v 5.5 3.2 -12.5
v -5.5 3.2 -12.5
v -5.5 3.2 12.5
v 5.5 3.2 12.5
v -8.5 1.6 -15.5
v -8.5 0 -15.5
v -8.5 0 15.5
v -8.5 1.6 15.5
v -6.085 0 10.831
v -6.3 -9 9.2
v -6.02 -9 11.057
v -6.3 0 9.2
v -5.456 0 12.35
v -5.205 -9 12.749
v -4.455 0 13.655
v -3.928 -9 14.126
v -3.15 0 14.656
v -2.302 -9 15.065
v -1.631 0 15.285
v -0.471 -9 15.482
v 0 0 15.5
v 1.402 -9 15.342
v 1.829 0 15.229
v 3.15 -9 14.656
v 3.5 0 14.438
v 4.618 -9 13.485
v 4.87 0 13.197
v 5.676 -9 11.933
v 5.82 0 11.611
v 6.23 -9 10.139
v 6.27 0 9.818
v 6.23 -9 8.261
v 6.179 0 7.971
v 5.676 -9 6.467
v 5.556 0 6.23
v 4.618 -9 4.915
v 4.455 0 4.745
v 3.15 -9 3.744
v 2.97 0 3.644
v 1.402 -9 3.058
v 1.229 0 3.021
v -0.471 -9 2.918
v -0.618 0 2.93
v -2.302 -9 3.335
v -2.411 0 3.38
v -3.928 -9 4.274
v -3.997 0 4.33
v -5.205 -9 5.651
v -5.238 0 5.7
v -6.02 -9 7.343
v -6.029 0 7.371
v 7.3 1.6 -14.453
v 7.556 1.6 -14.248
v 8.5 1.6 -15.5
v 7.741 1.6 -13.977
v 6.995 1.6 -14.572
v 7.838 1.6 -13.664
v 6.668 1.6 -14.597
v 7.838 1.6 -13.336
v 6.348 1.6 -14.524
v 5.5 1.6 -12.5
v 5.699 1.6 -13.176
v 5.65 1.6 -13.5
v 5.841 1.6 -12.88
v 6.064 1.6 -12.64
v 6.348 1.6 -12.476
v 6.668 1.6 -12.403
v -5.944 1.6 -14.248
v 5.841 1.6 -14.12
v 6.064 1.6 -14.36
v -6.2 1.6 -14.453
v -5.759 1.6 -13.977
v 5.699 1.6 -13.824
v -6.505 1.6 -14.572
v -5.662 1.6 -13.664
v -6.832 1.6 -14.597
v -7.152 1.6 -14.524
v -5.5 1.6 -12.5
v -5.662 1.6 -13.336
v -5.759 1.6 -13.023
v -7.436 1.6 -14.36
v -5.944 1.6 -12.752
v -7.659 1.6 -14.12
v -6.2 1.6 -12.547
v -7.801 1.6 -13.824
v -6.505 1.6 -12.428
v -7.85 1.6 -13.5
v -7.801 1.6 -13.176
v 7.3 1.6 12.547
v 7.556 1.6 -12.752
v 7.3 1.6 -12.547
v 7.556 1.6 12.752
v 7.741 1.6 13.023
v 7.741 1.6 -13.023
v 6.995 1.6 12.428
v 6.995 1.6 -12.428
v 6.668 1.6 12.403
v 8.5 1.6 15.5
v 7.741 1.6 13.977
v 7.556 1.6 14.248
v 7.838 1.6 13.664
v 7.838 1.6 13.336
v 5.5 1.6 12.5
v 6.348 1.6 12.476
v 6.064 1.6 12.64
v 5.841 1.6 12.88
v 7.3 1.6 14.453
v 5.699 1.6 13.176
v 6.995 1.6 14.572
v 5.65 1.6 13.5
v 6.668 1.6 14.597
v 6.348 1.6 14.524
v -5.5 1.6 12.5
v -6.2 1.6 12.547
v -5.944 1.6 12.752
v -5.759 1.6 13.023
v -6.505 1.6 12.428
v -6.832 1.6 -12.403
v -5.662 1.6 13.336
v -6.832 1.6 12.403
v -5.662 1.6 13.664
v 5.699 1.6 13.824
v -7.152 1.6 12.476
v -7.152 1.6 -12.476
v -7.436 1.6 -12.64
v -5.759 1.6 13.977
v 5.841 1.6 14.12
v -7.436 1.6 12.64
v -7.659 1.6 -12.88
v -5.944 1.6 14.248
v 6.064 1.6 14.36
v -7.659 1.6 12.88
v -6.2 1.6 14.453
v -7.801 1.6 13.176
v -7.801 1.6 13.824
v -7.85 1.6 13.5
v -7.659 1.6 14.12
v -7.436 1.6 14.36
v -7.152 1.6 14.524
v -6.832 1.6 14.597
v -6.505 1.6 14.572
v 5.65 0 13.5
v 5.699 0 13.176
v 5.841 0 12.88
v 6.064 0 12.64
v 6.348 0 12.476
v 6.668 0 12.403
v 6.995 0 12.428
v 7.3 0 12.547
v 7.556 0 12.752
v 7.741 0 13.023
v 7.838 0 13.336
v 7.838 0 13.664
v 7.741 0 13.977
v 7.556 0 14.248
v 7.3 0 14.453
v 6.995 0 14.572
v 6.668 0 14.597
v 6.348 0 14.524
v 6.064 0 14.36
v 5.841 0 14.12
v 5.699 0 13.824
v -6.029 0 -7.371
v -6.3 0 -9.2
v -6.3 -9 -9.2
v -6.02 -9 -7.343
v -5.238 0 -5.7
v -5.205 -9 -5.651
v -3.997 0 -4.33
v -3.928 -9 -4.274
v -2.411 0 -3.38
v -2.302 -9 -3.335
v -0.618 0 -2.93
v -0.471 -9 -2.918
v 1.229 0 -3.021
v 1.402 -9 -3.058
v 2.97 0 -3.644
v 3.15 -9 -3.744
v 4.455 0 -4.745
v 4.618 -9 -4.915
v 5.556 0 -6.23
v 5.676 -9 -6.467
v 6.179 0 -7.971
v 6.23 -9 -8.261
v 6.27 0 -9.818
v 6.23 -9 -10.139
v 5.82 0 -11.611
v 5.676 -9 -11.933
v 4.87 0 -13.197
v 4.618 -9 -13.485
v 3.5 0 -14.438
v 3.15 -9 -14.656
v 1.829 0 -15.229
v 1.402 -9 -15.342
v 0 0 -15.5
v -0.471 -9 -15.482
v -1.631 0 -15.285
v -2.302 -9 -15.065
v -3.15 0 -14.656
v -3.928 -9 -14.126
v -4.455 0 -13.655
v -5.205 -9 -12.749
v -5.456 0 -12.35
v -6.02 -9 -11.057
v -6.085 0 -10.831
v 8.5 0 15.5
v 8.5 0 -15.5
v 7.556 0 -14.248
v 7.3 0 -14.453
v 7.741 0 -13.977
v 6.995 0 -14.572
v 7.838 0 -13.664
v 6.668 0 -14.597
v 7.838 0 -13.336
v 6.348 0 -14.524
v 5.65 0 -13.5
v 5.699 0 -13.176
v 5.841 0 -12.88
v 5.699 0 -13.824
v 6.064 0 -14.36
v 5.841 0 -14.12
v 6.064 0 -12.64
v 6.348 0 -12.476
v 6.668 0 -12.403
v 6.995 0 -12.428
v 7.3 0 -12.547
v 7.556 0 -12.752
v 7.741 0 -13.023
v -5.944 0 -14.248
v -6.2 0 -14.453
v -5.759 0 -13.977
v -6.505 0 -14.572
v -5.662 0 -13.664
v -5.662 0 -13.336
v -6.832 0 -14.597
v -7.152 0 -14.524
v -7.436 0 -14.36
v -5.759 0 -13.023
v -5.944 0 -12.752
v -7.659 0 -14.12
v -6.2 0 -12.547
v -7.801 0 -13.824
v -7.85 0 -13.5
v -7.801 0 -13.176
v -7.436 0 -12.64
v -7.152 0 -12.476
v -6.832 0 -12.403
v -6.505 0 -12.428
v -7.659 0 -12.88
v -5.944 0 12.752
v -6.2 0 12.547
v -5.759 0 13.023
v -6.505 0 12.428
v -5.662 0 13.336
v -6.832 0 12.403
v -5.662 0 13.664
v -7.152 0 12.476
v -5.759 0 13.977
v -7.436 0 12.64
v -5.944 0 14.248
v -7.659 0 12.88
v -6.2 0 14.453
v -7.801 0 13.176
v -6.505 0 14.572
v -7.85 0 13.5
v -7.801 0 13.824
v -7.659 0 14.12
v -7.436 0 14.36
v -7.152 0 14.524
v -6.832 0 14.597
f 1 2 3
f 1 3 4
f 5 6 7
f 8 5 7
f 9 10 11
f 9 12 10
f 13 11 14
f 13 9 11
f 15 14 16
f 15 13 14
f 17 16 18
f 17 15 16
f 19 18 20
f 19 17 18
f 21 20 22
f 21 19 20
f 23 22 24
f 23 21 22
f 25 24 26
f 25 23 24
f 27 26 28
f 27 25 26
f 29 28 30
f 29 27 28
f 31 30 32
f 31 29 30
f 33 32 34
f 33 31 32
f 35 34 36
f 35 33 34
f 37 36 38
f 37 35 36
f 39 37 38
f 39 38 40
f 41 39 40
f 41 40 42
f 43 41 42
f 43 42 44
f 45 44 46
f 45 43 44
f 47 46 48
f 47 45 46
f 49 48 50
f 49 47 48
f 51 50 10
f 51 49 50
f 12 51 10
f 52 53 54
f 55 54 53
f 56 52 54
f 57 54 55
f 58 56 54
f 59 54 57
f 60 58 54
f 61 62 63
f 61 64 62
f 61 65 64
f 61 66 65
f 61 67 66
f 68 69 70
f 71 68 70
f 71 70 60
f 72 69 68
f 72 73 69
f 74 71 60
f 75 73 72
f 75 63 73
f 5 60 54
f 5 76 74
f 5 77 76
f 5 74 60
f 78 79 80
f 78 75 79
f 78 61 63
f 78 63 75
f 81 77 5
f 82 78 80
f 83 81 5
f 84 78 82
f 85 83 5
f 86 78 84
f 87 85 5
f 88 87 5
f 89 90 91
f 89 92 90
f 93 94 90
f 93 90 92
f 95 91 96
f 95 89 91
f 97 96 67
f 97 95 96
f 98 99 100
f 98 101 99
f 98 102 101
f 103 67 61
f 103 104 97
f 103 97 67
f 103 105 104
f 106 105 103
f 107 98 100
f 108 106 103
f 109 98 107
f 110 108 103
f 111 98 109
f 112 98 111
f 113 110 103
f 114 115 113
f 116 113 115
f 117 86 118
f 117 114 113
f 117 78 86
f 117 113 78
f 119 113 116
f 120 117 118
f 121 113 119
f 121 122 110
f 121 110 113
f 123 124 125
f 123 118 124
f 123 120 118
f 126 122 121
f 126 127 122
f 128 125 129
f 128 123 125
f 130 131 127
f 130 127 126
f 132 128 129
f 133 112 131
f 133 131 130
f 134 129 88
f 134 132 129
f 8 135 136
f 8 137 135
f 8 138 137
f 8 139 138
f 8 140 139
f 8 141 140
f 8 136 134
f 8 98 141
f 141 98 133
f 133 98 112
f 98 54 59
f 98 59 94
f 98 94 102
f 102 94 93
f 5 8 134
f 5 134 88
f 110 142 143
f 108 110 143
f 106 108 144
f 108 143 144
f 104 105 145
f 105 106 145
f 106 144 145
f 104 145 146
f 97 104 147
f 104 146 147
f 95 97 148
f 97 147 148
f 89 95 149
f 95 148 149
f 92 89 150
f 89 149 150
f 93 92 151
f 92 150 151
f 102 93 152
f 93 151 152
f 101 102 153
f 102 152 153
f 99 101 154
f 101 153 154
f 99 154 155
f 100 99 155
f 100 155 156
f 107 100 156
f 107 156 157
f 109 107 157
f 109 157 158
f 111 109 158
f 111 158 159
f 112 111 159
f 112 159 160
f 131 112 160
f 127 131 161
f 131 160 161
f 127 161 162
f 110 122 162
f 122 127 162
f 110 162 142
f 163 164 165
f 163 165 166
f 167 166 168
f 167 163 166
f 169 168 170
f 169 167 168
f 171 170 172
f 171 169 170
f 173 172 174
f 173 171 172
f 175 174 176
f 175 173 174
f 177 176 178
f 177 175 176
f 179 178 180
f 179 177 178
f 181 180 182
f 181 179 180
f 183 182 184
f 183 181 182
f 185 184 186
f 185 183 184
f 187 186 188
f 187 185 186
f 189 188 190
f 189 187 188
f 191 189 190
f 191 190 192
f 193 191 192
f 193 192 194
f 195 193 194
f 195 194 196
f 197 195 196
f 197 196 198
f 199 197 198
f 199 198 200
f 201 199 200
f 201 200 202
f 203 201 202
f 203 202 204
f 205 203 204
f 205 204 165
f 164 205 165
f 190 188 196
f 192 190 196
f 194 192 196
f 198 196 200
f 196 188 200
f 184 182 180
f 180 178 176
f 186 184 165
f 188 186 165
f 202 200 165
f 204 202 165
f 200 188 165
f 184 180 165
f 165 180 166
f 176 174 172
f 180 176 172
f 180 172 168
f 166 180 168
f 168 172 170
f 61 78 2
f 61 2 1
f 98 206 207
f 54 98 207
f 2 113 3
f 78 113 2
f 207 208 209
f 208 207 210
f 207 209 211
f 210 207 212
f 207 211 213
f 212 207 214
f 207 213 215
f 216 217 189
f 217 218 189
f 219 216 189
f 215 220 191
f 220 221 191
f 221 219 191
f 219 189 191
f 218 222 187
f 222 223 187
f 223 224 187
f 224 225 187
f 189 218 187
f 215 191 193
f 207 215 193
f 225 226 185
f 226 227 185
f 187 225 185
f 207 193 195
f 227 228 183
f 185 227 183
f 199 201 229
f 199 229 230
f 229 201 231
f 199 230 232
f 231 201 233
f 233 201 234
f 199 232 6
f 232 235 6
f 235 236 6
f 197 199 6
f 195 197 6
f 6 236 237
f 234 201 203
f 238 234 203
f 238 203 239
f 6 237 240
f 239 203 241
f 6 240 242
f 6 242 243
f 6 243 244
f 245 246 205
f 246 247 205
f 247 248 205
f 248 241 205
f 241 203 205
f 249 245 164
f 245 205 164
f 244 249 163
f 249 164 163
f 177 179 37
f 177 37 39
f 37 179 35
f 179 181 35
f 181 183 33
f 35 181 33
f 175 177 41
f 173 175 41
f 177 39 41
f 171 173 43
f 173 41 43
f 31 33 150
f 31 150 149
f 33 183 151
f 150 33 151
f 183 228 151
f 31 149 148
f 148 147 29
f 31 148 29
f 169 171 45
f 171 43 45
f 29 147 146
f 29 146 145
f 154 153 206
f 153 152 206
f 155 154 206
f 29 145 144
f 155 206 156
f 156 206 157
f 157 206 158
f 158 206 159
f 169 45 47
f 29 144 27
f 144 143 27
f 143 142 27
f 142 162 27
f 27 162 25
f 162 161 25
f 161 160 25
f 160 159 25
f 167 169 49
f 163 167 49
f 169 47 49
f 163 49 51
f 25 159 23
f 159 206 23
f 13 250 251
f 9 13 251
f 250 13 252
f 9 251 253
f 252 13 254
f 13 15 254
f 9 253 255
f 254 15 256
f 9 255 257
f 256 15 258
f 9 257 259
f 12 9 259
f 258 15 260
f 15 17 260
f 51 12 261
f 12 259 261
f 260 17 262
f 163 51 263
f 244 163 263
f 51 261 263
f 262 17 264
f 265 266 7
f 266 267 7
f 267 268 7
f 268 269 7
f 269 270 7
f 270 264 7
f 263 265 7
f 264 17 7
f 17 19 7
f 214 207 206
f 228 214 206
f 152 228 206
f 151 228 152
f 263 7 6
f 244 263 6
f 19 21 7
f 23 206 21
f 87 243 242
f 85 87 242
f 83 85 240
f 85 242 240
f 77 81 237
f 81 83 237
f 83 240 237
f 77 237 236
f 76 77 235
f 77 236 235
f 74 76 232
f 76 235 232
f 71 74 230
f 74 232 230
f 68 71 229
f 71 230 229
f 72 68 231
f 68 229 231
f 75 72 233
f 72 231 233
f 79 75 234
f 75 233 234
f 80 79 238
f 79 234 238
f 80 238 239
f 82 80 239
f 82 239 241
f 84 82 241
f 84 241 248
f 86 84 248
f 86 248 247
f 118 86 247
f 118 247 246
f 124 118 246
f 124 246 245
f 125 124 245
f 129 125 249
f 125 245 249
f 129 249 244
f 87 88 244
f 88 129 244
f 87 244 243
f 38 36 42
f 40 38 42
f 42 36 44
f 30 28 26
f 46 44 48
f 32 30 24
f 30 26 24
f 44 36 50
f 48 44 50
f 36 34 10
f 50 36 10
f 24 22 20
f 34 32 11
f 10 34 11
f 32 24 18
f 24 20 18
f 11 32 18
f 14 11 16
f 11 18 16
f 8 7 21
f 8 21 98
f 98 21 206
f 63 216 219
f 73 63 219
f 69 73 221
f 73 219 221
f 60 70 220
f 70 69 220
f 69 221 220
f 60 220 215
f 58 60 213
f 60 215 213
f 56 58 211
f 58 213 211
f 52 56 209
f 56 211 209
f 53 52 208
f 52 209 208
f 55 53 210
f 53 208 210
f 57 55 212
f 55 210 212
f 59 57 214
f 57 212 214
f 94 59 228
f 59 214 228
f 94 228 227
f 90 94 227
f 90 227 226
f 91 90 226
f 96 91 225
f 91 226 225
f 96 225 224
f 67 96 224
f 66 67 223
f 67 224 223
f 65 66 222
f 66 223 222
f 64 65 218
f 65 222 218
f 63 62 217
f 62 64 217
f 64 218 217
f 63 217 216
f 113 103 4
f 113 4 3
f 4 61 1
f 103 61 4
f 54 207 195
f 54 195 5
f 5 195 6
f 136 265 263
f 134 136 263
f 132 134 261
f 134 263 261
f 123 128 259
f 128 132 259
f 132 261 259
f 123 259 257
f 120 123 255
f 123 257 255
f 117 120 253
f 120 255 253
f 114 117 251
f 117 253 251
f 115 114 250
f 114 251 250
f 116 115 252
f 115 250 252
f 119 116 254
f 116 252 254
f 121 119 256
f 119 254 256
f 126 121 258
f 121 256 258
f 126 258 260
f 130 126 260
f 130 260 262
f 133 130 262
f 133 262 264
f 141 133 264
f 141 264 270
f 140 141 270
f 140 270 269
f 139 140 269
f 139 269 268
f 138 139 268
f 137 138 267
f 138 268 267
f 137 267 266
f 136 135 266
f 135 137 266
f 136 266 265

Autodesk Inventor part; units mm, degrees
ref_plane "YZ Plane" through (0, 0, 0) normal (1, 0, 0) x (0, 1, 0)
ref_plane "XZ Plane" through (0, 0, 0) normal (0, 1, 0) x (-1, 0, 0)
ref_plane "XY Plane" through (0, 0, 0) normal (0, 0, 1) x (1, 0, 0)
sketch "スケッチ1" plane through (0, 0, 0) normal (0, 1, 0) x (-1, 0, 0)
  line L0 (8.5, 15.5) -> (-8.5, 15.5)
  line L1 (-8.5, 15.5) -> (-8.5, -15.5)
  line L2 (-8.5, -15.5) -> (8.5, -15.5)
  line L3 (8.5, -15.5) -> (8.5, 15.5)
  circle A0 centre (0, 9.2) radius 6.3
  circle A1 centre (0, -9.2) radius 6.3
  circle A2 centre (6.75, -13.5) radius 1.1
  line L4 (6.75, -13.5) -> (-6.75, -13.5) construction
  line L5 (-6.75, -13.5) -> (-6.75, 13.5) construction
  line L6 (-6.75, 13.5) -> (6.75, 13.5) construction
  line L7 (6.75, 13.5) -> (6.75, -13.5) construction
  circle A3 centre (-6.75, -13.5) radius 1.1
  circle A4 centre (6.75, 13.5) radius 1.1
  circle A5 centre (-6.75, 13.5) radius 1.1
  point P0 (0, 0)
  point P1 (0, 15.5)
  point P2 (8.5, 0)
  point P3 (6.75, 0)
  point P4 (0, 13.5)
  dimension "d0" = 17
  dimension "d1" = 31
  dimension "d2" = 12.6
  dimension "d10" = 2.2
  dimension "d11" = 27
  dimension "d12" = 13.5
  dimension "d13" = 2.2
  dimension "d14" = 2.2
  dimension "d15" = 2.2
  dimension "d16" = 9.2
extrude "押し出し1" add sketch "スケッチ1" along normal blind 1.6 contours A0 | A1 | L3 L2 L1 L0
extrude "押し出し2" add sketch "スケッチ1" against normal blind 9 contours A0 | A1
sketch "スケッチ2" plane through (0, 1.6, 0) normal (0, 1, 0) x (1, 0, 0)
  line L0 (8.5, 15.5) -> (-8.5, 15.5) projected
  line L1 (-8.5, 15.5) -> (-8.5, -15.5) projected
  line L2 (-8.5, -15.5) -> (8.5, -15.5) projected
  line L3 (8.5, -15.5) -> (8.5, 15.5) projected
  line L4 (-5.5, -12.5) -> (-5.5, 12.5)
  line L5 (-5.5, 12.5) -> (5.5, 12.5)
  line L6 (5.5, 12.5) -> (5.5, -12.5)
  line L7 (5.5, -12.5) -> (-5.5, -12.5)
  point P0 (0, 0)
  dimension "d7" = 3
extrude "押し出し3" add sketch "スケッチ2" along normal blind 1.6 contours L4 L5 L6 L7
properties part number "UltrasonicSensor"
